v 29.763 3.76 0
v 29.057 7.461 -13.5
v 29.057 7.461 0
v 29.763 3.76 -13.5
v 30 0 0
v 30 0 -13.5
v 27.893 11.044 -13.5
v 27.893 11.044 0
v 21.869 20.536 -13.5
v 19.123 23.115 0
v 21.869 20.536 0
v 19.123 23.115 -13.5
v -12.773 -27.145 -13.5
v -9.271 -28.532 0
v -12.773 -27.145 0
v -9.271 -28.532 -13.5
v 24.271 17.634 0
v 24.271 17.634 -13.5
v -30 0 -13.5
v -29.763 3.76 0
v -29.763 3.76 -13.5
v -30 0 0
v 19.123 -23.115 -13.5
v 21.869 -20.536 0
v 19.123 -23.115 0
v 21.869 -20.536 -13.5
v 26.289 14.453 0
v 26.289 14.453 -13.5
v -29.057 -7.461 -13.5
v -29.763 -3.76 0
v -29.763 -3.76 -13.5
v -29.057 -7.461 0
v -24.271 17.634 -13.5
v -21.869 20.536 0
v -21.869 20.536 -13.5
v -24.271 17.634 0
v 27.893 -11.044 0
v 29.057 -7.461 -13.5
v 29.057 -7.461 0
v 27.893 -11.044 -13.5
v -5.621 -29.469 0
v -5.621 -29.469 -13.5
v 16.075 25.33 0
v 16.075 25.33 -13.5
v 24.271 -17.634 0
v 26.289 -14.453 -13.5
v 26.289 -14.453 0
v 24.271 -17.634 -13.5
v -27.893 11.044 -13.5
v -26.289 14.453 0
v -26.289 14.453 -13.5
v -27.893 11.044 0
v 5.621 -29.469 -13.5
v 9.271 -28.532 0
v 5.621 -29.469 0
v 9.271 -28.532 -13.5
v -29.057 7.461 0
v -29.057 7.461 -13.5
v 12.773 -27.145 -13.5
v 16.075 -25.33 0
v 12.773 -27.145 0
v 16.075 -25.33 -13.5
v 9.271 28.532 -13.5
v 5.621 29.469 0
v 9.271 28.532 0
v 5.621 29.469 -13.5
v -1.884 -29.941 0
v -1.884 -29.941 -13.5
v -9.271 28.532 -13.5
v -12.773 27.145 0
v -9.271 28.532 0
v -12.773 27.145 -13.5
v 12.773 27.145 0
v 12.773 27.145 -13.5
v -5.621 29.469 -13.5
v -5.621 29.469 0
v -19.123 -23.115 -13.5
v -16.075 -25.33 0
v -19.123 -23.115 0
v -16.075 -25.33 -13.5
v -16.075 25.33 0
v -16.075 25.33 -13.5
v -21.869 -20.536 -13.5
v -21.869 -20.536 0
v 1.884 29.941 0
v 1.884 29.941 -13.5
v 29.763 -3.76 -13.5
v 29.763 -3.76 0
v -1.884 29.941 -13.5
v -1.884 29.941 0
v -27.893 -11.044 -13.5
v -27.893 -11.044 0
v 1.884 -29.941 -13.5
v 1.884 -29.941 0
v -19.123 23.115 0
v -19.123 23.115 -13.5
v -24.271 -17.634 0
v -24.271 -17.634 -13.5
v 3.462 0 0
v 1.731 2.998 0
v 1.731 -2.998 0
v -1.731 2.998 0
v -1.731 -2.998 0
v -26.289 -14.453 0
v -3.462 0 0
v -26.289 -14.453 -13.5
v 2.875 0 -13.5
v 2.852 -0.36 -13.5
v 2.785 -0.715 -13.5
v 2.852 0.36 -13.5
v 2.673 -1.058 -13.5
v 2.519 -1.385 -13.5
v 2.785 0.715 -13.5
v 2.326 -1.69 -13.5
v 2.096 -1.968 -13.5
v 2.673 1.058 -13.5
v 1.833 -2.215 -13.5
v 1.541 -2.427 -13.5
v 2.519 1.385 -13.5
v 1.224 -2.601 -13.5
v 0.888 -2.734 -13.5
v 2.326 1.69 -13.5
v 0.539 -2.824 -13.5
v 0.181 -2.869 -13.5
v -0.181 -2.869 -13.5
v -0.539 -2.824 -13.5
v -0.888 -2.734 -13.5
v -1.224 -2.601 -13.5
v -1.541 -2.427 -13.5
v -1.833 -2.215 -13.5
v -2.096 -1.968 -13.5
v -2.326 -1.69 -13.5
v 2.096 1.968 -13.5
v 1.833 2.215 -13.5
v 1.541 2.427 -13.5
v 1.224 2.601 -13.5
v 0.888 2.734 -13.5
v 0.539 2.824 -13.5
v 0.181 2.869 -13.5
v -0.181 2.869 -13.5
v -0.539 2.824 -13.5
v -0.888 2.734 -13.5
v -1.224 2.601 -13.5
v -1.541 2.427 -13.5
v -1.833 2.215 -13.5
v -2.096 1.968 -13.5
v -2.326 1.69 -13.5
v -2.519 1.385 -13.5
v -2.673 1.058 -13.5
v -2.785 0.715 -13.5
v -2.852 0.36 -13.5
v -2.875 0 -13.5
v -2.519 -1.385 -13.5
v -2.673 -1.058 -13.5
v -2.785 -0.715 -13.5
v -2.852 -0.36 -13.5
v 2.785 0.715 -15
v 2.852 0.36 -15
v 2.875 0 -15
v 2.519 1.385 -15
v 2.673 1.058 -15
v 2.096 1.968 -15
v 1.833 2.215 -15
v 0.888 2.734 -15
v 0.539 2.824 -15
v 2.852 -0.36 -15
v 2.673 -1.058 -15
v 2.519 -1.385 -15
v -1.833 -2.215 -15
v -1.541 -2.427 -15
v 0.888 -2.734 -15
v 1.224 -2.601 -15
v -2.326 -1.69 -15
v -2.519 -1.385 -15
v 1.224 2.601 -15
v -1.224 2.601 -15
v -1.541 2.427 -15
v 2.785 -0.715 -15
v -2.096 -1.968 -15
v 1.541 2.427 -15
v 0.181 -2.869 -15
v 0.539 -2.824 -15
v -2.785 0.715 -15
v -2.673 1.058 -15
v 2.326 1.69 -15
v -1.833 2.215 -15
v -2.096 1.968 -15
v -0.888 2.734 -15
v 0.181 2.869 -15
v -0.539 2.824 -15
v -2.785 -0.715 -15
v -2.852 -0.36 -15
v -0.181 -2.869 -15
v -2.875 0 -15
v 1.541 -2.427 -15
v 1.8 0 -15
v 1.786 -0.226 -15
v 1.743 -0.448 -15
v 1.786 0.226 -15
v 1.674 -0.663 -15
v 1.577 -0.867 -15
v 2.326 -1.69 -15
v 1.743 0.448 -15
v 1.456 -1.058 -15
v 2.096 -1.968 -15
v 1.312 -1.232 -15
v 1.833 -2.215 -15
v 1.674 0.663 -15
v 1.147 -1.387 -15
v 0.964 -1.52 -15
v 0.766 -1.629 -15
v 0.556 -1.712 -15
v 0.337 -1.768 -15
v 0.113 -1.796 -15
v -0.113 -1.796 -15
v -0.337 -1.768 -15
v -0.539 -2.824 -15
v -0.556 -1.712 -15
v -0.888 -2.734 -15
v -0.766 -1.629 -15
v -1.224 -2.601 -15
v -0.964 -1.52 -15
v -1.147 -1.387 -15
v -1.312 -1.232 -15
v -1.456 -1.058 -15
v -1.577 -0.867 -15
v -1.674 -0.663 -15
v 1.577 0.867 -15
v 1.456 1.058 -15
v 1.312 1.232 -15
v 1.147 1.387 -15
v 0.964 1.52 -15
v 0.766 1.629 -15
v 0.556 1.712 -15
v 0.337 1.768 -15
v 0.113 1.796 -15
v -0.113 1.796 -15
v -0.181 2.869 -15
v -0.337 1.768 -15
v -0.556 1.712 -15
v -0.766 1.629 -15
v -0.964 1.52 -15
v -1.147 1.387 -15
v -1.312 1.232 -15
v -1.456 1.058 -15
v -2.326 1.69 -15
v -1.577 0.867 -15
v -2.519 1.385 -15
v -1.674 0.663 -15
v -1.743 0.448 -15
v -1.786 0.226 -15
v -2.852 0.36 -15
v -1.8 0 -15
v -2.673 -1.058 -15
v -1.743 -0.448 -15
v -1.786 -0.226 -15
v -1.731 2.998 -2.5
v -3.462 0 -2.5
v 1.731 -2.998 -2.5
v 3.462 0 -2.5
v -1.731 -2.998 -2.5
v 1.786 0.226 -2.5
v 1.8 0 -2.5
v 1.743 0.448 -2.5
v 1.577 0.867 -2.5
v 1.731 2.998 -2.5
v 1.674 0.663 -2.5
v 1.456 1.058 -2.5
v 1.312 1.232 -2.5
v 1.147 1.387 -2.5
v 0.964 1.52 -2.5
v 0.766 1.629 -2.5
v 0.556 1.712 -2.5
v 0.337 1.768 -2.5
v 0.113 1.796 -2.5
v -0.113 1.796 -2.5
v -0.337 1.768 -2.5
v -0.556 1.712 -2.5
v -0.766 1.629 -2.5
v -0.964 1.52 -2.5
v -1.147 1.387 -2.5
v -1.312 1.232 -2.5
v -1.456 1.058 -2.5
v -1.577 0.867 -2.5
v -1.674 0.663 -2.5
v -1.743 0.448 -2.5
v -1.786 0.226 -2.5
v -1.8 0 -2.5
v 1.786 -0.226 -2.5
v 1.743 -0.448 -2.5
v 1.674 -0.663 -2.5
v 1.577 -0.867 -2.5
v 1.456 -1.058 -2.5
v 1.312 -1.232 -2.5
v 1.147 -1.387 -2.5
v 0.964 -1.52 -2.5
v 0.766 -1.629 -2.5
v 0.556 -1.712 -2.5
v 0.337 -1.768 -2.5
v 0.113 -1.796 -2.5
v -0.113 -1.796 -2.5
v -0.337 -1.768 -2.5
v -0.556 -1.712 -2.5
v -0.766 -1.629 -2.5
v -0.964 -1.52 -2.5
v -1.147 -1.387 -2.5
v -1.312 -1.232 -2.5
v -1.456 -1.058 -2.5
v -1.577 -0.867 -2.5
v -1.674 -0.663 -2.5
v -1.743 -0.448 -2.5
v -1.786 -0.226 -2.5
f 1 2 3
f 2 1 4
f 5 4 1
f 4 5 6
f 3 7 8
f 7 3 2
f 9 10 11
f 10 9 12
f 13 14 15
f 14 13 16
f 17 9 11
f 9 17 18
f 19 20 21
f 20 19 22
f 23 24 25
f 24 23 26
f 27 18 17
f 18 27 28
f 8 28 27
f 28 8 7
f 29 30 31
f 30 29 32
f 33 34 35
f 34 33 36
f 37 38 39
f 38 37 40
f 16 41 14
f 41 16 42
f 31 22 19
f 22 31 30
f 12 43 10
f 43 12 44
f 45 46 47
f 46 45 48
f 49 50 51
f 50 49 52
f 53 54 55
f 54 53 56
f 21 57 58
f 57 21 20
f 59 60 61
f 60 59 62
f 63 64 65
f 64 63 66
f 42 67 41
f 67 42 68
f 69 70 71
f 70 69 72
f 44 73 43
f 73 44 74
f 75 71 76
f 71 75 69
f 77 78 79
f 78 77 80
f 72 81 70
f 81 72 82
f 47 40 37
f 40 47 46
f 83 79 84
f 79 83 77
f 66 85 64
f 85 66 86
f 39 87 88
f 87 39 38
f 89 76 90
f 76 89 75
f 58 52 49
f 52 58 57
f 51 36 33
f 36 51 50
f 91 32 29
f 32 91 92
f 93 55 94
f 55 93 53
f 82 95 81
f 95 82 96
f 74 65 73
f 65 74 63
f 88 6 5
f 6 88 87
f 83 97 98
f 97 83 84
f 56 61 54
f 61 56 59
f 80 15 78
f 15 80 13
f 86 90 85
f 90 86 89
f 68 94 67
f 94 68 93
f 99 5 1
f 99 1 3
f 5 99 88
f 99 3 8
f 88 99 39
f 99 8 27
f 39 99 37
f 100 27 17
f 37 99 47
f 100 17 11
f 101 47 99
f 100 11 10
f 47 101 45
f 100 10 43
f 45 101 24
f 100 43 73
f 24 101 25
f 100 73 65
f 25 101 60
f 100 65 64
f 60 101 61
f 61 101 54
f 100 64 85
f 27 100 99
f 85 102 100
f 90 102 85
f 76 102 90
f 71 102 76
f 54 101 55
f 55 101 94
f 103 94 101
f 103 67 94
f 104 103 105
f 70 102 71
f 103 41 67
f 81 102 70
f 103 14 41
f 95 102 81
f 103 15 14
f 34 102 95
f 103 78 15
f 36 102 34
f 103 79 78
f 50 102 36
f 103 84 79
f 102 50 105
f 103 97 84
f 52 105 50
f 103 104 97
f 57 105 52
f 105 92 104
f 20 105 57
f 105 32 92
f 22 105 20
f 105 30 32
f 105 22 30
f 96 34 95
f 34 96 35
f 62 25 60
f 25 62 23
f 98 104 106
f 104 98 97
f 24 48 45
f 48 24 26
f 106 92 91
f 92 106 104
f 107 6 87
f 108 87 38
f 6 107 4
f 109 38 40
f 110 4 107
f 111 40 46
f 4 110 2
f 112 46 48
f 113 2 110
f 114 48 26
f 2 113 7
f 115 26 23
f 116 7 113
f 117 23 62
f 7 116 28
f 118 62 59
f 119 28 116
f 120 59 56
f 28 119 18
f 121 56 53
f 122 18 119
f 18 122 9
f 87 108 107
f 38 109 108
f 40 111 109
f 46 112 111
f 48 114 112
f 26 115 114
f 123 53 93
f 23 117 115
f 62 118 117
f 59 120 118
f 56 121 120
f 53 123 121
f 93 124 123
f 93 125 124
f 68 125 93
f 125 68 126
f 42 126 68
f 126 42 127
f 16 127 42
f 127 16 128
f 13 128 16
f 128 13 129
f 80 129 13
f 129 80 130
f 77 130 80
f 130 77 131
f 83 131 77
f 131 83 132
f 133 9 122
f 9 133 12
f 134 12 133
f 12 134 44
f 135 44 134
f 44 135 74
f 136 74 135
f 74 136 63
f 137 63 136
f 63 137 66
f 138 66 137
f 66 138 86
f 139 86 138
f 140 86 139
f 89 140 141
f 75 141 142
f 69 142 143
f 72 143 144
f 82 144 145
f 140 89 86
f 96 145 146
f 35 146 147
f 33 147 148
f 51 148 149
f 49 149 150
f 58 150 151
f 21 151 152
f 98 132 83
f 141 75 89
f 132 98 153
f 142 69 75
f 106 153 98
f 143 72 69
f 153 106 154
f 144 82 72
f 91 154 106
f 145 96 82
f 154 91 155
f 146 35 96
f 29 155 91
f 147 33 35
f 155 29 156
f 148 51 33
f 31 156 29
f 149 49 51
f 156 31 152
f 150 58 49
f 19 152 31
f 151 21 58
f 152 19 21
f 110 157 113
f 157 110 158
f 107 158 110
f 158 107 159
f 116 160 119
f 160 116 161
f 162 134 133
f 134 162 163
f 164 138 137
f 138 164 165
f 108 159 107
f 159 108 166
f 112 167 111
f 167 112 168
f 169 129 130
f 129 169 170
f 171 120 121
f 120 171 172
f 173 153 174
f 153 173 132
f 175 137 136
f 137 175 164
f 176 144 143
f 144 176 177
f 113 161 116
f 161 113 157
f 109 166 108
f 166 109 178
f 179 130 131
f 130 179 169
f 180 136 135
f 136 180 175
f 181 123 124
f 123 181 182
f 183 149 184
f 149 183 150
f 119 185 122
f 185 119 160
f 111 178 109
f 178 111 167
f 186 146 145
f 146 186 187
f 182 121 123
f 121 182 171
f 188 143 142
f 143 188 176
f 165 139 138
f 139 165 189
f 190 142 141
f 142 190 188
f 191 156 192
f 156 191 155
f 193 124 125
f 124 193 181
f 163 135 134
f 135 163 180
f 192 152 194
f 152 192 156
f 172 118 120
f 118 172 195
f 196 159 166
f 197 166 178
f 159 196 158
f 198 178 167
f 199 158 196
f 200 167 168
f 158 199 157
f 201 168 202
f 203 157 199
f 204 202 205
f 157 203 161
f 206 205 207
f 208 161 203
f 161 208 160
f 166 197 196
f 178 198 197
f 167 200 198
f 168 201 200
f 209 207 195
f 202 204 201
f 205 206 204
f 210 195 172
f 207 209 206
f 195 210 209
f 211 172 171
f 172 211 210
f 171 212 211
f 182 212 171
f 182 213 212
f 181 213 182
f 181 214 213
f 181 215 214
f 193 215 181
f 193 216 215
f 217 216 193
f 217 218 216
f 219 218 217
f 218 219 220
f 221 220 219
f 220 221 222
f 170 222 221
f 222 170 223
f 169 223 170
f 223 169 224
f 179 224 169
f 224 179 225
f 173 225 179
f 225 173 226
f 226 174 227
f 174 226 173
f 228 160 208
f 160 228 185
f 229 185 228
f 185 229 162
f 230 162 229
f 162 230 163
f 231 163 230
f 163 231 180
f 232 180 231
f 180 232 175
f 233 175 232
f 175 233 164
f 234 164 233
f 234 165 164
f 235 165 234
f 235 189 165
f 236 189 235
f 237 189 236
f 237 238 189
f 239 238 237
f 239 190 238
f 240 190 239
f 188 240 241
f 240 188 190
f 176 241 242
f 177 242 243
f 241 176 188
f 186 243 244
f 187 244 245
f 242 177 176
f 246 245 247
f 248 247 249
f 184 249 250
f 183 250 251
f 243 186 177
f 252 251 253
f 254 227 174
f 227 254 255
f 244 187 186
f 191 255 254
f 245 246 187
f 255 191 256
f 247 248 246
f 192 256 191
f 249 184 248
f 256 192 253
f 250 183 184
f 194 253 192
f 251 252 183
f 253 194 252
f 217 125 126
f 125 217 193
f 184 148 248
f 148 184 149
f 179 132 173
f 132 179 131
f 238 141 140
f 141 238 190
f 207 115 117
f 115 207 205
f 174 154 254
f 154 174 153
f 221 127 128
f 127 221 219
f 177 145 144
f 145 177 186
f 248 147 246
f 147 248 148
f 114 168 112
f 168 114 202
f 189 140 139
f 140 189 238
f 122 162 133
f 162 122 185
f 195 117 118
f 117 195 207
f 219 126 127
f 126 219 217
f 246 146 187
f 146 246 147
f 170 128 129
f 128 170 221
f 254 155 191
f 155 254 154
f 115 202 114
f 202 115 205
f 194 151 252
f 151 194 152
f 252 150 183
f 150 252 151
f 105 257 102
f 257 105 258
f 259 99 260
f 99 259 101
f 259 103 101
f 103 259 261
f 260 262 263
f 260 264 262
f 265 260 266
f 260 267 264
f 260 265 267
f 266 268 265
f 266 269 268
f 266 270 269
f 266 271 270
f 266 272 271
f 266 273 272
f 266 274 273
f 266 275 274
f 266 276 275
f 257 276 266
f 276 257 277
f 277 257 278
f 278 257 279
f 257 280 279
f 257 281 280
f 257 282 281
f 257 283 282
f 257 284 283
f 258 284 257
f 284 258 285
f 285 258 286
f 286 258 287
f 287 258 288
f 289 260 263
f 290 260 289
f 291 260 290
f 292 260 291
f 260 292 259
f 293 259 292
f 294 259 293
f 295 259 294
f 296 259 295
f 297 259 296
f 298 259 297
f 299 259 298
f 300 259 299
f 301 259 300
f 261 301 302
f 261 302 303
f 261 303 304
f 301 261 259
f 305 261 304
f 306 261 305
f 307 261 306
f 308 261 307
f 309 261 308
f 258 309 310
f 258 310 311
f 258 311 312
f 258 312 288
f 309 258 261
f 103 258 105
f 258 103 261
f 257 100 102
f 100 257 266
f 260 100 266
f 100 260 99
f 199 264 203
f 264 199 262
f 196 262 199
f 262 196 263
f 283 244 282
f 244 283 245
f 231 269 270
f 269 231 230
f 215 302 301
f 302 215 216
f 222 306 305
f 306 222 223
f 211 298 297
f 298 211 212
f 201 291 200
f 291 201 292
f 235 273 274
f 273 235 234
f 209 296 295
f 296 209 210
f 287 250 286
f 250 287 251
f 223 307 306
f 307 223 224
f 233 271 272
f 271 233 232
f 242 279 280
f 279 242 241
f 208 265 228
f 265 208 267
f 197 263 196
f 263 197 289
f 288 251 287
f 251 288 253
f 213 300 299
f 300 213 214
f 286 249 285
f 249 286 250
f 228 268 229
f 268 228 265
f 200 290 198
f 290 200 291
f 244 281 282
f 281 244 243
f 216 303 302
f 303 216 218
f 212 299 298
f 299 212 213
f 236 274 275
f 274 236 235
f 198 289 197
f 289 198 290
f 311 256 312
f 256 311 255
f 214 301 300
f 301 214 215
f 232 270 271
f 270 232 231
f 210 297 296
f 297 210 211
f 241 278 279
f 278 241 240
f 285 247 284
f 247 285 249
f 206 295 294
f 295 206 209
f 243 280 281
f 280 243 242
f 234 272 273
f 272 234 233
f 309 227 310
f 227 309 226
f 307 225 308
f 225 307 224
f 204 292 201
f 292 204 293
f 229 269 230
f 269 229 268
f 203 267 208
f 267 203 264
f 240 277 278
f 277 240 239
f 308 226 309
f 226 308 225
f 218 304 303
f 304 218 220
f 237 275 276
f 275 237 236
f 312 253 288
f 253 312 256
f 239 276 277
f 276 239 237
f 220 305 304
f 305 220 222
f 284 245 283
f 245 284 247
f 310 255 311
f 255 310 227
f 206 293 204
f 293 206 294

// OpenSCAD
$fn = 50;


difference() {
	union() {
		translate(v = [0, 0, -13.5000000000]) {
			cylinder(h = 13.5000000000, r = 30.0000000000);
		}
		#translate(v = [0, 0, -15.0000000000]) {
			cylinder(h = 15, r = 2.8750000000);
		}
	}
	union() {
		translate(v = [0, 0, 0]) {
			rotate(a = [0, 0, 0]) {
				difference() {
					union() {
						translate(v = [0, 0, -2.5000000000]) {
							linear_extrude(height = 2.5000000000) {
								polygon(points = [[3.4620000000, 0.0000000000], [1.7310000000, 2.9981799479], [-1.7310000000, 2.9981799479], [-3.4620000000, 0.0000000000], [-1.7310000000, -2.9981799479], [1.7310000000, -2.9981799479]]);
							}
						}
					}
					union();
				}
			}
		}
		#translate(v = [0, 0, -100.0000000000]) {
			cylinder(h = 200, r = 1.8000000000);
		}
	}
}
